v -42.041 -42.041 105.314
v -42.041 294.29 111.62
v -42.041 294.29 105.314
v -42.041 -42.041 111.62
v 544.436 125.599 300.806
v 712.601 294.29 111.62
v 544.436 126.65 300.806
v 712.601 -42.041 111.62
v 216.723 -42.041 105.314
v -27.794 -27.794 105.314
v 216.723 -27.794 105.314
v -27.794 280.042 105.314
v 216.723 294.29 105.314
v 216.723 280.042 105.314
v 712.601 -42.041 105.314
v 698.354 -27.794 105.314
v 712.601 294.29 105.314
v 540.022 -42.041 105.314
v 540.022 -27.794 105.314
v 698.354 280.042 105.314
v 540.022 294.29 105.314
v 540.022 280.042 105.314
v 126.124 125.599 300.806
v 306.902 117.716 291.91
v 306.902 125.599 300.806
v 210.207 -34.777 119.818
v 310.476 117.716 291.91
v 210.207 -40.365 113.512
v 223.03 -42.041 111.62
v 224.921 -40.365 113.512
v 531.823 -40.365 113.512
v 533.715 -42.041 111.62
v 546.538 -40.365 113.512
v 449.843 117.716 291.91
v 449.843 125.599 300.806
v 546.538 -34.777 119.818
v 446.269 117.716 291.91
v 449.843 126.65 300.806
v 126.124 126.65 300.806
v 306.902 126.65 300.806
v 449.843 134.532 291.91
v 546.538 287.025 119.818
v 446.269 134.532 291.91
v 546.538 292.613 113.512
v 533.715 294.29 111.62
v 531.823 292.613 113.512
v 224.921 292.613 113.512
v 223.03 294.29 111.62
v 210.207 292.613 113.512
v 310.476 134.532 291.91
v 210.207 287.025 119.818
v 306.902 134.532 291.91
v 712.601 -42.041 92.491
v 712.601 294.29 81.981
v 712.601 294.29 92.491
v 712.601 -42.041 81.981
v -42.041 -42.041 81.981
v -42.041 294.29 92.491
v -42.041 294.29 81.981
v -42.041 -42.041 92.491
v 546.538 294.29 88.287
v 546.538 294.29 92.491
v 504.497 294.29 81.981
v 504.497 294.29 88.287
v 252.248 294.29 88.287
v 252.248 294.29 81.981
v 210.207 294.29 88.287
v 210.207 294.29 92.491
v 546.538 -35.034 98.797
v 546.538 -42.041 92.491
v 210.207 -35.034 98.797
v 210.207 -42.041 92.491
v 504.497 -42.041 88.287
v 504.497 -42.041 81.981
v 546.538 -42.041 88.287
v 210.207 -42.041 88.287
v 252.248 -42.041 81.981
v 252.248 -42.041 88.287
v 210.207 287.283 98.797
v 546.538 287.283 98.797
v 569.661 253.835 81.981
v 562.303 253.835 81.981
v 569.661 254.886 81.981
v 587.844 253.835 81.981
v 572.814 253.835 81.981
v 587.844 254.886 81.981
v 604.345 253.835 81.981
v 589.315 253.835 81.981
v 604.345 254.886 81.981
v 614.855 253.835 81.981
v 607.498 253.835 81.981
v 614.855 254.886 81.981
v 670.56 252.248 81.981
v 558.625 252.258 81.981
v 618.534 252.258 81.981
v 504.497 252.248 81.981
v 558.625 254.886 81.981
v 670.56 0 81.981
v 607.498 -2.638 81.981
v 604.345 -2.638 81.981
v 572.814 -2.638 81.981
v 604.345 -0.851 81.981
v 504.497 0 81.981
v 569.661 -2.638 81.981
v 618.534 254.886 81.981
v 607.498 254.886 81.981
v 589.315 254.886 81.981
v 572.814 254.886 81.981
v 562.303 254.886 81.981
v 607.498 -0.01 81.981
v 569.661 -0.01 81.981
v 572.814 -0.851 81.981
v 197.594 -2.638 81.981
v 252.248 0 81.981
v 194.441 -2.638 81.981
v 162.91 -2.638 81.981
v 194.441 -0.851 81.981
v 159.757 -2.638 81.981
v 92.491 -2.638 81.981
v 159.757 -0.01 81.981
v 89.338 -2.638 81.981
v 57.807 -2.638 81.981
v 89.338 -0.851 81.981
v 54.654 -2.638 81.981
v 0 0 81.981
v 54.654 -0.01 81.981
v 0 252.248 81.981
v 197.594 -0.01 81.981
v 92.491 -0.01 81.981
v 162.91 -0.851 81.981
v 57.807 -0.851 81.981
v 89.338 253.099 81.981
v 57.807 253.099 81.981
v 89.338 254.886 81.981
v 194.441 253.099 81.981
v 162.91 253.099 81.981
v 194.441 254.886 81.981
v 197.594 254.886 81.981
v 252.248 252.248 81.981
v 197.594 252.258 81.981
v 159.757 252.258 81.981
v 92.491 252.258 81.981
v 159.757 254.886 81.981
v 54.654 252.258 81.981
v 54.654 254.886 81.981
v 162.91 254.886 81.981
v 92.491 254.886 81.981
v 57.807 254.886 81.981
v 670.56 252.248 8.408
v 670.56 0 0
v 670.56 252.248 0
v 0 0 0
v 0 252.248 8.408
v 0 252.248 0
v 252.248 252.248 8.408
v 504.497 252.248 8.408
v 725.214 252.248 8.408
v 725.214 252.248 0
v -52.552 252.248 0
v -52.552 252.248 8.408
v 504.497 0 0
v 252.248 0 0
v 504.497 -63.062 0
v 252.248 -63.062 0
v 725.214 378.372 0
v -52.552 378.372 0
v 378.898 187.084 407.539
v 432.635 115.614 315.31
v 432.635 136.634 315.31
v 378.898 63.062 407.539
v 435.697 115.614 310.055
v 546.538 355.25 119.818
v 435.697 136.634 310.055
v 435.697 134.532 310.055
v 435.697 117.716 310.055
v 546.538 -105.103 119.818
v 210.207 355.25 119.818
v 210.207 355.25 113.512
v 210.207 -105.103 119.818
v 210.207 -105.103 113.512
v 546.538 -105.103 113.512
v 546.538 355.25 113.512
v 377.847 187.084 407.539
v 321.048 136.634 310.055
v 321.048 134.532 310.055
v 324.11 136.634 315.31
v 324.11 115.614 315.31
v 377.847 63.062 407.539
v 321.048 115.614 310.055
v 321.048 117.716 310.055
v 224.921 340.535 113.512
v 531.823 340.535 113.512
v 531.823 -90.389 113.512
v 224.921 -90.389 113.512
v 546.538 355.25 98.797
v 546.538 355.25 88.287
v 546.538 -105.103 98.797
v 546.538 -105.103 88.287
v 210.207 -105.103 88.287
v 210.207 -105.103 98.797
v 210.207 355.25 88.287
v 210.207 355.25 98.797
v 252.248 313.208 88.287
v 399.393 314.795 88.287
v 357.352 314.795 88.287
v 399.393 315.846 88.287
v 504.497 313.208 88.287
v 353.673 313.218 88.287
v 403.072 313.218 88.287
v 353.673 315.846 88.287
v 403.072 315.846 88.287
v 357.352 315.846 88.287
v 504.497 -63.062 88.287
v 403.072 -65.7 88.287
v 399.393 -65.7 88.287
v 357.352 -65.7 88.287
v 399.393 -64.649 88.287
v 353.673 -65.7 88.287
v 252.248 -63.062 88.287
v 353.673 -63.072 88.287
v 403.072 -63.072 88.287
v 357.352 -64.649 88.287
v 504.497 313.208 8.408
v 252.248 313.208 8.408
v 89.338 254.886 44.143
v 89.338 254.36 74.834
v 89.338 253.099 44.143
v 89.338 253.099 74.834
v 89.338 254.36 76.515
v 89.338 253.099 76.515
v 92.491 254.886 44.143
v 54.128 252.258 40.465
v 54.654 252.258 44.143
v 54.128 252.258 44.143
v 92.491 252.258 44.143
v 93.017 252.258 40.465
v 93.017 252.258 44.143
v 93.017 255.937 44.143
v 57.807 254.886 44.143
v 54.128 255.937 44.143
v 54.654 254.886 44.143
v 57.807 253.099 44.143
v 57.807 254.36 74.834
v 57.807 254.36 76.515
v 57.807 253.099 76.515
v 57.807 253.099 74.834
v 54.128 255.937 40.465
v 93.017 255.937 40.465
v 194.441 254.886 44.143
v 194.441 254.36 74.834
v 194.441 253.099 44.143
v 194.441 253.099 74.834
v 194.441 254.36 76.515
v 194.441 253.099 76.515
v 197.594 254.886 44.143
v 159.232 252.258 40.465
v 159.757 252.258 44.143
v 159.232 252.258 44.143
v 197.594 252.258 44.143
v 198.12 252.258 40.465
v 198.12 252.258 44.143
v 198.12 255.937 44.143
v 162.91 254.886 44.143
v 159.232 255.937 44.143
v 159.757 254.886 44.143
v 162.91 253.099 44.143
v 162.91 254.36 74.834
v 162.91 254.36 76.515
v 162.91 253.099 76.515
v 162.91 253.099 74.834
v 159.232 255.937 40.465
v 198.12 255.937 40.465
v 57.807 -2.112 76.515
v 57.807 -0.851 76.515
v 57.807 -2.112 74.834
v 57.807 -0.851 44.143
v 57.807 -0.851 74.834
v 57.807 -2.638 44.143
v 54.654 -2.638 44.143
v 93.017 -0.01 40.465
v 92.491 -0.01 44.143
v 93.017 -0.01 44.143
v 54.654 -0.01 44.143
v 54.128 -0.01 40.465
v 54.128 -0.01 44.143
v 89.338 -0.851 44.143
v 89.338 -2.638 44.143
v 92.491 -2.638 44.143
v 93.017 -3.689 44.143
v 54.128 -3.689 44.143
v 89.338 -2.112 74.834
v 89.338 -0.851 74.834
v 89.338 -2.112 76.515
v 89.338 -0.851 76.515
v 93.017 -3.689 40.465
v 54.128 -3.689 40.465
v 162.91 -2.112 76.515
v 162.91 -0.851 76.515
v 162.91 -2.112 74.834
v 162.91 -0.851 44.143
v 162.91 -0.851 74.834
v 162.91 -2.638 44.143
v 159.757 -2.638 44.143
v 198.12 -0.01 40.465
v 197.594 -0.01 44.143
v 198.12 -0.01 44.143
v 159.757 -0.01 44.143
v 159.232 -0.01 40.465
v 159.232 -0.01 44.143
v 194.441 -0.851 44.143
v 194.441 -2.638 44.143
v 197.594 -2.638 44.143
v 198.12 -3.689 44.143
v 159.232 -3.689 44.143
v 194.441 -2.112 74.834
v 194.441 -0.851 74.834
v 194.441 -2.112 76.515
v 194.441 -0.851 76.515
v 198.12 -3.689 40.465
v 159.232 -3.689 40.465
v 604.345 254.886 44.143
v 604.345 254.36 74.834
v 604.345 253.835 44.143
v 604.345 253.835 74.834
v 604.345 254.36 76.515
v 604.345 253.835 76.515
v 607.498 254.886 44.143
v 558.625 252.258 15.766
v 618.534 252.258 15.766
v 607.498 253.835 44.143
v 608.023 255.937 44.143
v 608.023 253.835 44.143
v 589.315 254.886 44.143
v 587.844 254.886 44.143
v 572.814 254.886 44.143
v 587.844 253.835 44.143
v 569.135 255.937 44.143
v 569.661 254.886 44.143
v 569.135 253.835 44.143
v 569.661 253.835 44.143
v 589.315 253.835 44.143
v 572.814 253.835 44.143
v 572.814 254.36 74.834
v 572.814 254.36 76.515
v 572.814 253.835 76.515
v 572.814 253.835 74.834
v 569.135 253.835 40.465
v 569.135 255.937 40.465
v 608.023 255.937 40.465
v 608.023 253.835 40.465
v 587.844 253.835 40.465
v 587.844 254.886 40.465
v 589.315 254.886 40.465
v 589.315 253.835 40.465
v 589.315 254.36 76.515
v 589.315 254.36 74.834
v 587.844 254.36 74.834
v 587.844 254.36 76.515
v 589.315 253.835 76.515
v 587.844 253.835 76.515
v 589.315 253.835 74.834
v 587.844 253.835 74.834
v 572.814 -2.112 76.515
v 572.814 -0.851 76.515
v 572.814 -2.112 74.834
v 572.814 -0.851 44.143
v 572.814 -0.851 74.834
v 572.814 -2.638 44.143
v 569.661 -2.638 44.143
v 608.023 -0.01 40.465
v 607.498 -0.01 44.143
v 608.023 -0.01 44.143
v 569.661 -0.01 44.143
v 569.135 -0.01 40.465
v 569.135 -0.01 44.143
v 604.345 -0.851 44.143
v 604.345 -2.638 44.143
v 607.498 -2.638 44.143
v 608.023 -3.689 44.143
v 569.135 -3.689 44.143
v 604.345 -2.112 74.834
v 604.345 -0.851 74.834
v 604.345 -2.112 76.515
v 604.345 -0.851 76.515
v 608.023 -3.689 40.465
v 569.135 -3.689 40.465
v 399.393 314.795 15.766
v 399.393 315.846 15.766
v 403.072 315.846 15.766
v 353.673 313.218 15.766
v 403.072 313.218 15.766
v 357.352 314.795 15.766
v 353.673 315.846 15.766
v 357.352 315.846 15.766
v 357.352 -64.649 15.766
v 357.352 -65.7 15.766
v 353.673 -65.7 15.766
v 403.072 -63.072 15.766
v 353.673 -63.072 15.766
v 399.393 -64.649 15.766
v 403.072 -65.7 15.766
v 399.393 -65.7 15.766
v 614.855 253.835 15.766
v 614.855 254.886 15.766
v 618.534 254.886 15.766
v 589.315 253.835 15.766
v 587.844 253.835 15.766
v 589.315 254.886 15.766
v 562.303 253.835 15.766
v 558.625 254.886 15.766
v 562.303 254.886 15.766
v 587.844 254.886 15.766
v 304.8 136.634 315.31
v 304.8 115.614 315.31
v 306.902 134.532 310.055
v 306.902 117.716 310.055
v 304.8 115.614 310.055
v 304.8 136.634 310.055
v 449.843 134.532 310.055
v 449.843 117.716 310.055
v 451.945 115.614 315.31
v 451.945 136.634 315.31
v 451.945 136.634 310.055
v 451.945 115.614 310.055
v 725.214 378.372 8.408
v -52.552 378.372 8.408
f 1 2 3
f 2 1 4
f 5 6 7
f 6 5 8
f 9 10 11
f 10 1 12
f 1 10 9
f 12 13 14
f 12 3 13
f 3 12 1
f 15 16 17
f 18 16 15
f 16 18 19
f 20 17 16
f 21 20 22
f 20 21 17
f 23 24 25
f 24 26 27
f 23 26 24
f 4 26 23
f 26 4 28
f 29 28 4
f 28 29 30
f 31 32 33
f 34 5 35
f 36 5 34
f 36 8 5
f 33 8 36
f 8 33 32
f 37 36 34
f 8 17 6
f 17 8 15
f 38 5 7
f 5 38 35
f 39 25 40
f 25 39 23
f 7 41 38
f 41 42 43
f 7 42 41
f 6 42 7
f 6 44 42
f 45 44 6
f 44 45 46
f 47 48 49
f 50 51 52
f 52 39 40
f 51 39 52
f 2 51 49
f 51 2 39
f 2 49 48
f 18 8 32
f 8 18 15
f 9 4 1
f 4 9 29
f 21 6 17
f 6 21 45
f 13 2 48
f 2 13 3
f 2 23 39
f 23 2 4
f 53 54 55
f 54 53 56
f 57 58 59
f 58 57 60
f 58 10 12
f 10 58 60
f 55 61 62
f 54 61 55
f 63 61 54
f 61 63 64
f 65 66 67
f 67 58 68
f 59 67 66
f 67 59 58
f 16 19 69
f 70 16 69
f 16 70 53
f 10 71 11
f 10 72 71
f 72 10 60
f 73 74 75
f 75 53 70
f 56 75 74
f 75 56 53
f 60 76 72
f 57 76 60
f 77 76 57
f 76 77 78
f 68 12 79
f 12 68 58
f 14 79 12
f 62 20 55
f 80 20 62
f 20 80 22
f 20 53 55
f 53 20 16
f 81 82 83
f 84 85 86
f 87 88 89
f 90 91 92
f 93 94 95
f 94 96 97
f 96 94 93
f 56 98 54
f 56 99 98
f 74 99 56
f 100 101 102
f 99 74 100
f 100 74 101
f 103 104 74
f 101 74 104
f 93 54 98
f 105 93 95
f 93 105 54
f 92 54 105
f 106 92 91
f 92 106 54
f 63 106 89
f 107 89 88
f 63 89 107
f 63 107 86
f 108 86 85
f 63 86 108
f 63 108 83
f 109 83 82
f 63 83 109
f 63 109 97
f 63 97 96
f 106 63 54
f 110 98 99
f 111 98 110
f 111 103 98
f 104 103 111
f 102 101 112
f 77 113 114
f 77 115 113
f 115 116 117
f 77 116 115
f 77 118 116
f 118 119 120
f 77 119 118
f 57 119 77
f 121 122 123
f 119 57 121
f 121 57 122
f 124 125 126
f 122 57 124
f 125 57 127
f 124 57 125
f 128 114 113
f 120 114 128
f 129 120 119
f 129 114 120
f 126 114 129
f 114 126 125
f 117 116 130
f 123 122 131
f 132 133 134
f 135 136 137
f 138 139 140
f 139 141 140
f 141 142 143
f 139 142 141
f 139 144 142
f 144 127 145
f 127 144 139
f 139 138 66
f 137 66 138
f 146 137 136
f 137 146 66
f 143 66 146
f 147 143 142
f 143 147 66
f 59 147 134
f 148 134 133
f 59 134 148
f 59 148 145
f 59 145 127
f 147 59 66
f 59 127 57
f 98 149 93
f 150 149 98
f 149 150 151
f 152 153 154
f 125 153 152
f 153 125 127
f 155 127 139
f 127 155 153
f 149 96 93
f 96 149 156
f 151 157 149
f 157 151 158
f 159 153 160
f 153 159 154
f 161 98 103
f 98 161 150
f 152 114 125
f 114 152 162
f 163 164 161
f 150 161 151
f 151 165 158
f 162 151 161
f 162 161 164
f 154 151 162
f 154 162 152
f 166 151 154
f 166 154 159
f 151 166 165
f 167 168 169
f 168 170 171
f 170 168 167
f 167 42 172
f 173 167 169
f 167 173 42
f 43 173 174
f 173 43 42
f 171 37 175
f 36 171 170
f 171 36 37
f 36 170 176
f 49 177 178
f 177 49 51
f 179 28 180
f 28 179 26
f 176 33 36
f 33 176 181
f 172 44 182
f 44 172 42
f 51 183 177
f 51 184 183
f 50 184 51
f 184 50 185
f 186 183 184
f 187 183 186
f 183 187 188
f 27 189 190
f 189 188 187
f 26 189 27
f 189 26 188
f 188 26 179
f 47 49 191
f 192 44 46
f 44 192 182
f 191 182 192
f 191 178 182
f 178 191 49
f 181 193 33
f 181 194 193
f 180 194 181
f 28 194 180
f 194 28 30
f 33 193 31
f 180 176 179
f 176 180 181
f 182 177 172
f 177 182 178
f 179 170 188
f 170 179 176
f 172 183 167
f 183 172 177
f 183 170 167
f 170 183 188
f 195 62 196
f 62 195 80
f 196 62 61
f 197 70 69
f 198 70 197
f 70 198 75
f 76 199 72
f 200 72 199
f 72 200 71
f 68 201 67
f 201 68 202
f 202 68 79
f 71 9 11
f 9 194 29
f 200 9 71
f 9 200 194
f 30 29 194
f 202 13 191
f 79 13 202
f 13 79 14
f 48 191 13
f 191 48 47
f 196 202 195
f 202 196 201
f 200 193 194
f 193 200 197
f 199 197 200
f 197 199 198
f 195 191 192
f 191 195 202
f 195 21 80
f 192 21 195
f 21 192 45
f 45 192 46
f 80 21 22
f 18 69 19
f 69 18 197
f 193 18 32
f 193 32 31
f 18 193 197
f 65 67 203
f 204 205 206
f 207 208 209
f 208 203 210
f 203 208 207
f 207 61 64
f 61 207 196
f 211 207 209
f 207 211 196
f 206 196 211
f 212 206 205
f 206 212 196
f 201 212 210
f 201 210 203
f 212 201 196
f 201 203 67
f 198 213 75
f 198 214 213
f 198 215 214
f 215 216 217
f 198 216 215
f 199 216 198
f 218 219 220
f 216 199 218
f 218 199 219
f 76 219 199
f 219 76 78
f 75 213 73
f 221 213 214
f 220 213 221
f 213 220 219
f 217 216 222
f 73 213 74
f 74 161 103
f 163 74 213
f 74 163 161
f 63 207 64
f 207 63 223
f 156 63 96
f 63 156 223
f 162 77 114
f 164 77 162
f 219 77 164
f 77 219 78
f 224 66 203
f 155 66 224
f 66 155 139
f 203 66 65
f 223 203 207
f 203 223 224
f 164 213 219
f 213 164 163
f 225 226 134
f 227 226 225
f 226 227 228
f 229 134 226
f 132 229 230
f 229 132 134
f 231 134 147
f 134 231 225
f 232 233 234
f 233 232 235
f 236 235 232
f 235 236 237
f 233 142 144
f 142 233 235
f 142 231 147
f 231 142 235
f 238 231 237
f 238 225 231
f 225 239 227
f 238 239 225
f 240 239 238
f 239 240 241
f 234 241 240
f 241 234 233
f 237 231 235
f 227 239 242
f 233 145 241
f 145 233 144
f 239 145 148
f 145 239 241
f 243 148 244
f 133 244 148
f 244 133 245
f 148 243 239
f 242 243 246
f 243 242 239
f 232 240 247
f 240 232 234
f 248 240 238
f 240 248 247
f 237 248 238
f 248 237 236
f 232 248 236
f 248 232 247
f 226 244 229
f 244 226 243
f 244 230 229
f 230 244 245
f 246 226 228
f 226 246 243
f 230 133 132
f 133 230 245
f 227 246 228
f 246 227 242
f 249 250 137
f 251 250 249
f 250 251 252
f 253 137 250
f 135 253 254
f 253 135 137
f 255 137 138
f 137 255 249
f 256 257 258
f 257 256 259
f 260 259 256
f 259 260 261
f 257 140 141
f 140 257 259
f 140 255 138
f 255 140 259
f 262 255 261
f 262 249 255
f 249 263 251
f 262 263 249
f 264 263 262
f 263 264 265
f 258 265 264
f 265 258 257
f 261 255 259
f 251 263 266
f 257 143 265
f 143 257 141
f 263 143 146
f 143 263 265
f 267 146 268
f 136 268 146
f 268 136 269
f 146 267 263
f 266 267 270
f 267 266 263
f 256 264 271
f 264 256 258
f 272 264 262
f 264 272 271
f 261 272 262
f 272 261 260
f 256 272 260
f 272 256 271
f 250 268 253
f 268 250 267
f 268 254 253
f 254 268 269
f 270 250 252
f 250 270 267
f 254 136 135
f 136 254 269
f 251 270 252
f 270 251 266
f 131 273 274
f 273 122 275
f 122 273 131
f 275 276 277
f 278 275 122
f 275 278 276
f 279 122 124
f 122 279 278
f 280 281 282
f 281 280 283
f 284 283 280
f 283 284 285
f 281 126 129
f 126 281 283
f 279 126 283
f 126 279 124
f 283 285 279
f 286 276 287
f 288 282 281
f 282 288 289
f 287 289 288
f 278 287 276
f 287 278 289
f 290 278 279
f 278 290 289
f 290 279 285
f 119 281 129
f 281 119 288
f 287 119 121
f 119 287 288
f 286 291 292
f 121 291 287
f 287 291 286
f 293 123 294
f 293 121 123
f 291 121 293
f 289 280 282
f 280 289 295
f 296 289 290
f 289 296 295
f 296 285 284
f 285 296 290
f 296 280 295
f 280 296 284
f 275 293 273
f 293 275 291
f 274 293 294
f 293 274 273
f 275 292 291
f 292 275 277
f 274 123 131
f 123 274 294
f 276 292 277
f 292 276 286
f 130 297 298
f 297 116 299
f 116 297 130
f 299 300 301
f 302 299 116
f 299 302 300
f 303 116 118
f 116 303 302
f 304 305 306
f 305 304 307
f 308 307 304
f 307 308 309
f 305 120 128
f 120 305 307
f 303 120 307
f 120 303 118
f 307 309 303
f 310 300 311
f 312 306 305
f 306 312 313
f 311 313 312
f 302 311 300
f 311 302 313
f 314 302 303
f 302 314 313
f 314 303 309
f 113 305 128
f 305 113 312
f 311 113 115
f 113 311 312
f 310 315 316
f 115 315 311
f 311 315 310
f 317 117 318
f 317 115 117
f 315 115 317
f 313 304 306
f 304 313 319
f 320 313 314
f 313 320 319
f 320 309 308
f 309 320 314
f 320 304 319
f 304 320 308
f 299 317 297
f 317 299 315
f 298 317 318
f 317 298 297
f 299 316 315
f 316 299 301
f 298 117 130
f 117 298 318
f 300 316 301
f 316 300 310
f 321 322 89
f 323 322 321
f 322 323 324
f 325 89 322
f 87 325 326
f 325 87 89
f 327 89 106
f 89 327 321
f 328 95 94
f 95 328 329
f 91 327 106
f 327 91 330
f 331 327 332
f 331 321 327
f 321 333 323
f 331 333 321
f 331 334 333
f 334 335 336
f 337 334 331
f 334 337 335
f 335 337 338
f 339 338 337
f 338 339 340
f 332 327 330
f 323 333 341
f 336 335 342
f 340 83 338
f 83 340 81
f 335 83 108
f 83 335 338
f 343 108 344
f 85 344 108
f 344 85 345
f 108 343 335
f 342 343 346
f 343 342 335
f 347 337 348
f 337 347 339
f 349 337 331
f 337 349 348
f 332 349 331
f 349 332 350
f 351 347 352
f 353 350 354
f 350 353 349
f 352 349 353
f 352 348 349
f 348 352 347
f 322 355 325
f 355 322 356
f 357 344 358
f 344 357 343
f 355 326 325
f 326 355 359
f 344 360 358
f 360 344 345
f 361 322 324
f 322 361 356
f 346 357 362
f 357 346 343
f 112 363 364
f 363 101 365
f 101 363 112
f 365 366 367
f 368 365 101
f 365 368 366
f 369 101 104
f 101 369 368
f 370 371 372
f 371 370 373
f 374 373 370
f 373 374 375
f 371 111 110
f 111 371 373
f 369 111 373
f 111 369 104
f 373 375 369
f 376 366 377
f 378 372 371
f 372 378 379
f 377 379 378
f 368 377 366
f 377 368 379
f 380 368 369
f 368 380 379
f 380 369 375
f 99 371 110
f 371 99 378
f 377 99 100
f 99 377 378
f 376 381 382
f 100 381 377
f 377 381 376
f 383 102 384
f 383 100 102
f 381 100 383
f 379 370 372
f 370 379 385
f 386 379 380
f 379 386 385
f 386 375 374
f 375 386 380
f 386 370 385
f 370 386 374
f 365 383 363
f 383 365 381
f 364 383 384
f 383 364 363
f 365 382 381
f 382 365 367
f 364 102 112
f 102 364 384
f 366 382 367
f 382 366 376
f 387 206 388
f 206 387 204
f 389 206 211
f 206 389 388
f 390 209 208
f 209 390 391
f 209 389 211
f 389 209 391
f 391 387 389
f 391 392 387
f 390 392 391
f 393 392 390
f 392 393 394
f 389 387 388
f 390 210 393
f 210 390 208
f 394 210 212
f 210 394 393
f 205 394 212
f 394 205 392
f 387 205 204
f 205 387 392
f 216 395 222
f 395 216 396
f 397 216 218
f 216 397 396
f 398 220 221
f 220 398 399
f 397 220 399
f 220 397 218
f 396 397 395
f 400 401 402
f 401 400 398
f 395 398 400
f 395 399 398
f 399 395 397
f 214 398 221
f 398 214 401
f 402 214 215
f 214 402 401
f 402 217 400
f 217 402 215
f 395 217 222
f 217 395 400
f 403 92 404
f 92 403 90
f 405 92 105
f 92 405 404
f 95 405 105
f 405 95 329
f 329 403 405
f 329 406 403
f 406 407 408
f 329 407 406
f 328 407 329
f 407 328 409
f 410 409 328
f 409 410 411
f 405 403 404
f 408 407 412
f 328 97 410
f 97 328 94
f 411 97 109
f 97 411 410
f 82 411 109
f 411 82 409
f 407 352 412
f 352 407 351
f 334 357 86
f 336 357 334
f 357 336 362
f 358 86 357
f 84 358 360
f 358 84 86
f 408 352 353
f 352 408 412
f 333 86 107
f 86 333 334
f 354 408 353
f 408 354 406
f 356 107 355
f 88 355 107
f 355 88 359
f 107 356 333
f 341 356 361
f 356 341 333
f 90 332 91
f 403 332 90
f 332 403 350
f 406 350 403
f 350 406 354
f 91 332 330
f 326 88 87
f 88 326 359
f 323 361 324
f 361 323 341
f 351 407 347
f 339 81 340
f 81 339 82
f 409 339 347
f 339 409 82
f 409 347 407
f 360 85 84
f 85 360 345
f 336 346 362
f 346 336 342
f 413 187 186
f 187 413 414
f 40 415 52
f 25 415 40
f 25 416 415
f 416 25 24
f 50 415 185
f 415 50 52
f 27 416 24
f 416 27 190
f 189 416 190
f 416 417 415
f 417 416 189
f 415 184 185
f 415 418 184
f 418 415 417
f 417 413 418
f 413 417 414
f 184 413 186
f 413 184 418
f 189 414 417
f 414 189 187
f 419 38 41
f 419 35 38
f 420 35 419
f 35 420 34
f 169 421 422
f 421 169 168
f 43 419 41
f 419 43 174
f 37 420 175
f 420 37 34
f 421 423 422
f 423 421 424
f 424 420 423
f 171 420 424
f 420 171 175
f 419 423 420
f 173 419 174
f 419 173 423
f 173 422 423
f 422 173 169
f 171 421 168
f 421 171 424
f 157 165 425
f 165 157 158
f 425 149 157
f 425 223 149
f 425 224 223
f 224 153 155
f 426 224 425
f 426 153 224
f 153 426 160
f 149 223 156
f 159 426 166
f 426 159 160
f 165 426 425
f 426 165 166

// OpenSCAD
// =====================================================================
//  MILWAUKEE ROAD - RACINE JUNCTION, WIS. UNION DEPOT (C.M.&ST.P. AND C.&N.W.)
//  Source: Album sheets 141-142, drawing 9804, Apr 6 1900 (J. U. Nettenstrom).  Drawings are private reference (in copyright):
//  Research Library / RSW / Stations / Standard depots / Album of Depot Plans 1919.
//  Rib Side Works, 24 Nov 2026. FIRST SHAPE MODEL for review - not cut into print sections.
//  KNOWN (from the sheet): 63 ft 10 in x 24 ft (35 ft 9 at the octagon); octagonal centre with back-to-back C.&N.W. and C.M.&St.P. waiting rooms 17 x 22, two offices 10 x 15, baggage 15 x 22; stone base, bell-cast hip roofs, cresting. Octagon shown as a square block for now.
//  ESTIMATE: wall and ridge heights where not written, window count and spacing, colours.
//  Built with the shared depot builder ../../../_common/rsw_depot.scad (x along the track,
//  y = 0 town side, track side +y, feet).  SCALE: 29 = G, 48 = O, 87 = HO.
// =====================================================================
SCALE = 29;
include <../../../_common/rsw_depot.scad>

depot(blocks = [[0, 63.8, 0, 24, 12, 0.9, 3, 4, 3], [24, 24, -6, 35.8, 13, 1.0, 3, 4, 3]],
      pavs   = [],
      wins   = [[7.0, 1, 3, 6, 4.2], [17.0, 1, 3, 6, 4.2], [7.0, 0, 3, 6, 4.2], [17.0, 0, 3, 6, 4.2], [56.0, 1, 3, 6, 4.2], [56.0, 0, 3, 6, 4.2]],
      doors  = [[36, 1, 4, 8, 0, 1], [36, 0, 4, 8, 0, 1], [56, 1, 5, 8, 1]],
      bays   = [],
      chims  = [[30, 12, 30], [42, 12, 30]],
      plat   = [-5, 74, 12, 0.8]);
